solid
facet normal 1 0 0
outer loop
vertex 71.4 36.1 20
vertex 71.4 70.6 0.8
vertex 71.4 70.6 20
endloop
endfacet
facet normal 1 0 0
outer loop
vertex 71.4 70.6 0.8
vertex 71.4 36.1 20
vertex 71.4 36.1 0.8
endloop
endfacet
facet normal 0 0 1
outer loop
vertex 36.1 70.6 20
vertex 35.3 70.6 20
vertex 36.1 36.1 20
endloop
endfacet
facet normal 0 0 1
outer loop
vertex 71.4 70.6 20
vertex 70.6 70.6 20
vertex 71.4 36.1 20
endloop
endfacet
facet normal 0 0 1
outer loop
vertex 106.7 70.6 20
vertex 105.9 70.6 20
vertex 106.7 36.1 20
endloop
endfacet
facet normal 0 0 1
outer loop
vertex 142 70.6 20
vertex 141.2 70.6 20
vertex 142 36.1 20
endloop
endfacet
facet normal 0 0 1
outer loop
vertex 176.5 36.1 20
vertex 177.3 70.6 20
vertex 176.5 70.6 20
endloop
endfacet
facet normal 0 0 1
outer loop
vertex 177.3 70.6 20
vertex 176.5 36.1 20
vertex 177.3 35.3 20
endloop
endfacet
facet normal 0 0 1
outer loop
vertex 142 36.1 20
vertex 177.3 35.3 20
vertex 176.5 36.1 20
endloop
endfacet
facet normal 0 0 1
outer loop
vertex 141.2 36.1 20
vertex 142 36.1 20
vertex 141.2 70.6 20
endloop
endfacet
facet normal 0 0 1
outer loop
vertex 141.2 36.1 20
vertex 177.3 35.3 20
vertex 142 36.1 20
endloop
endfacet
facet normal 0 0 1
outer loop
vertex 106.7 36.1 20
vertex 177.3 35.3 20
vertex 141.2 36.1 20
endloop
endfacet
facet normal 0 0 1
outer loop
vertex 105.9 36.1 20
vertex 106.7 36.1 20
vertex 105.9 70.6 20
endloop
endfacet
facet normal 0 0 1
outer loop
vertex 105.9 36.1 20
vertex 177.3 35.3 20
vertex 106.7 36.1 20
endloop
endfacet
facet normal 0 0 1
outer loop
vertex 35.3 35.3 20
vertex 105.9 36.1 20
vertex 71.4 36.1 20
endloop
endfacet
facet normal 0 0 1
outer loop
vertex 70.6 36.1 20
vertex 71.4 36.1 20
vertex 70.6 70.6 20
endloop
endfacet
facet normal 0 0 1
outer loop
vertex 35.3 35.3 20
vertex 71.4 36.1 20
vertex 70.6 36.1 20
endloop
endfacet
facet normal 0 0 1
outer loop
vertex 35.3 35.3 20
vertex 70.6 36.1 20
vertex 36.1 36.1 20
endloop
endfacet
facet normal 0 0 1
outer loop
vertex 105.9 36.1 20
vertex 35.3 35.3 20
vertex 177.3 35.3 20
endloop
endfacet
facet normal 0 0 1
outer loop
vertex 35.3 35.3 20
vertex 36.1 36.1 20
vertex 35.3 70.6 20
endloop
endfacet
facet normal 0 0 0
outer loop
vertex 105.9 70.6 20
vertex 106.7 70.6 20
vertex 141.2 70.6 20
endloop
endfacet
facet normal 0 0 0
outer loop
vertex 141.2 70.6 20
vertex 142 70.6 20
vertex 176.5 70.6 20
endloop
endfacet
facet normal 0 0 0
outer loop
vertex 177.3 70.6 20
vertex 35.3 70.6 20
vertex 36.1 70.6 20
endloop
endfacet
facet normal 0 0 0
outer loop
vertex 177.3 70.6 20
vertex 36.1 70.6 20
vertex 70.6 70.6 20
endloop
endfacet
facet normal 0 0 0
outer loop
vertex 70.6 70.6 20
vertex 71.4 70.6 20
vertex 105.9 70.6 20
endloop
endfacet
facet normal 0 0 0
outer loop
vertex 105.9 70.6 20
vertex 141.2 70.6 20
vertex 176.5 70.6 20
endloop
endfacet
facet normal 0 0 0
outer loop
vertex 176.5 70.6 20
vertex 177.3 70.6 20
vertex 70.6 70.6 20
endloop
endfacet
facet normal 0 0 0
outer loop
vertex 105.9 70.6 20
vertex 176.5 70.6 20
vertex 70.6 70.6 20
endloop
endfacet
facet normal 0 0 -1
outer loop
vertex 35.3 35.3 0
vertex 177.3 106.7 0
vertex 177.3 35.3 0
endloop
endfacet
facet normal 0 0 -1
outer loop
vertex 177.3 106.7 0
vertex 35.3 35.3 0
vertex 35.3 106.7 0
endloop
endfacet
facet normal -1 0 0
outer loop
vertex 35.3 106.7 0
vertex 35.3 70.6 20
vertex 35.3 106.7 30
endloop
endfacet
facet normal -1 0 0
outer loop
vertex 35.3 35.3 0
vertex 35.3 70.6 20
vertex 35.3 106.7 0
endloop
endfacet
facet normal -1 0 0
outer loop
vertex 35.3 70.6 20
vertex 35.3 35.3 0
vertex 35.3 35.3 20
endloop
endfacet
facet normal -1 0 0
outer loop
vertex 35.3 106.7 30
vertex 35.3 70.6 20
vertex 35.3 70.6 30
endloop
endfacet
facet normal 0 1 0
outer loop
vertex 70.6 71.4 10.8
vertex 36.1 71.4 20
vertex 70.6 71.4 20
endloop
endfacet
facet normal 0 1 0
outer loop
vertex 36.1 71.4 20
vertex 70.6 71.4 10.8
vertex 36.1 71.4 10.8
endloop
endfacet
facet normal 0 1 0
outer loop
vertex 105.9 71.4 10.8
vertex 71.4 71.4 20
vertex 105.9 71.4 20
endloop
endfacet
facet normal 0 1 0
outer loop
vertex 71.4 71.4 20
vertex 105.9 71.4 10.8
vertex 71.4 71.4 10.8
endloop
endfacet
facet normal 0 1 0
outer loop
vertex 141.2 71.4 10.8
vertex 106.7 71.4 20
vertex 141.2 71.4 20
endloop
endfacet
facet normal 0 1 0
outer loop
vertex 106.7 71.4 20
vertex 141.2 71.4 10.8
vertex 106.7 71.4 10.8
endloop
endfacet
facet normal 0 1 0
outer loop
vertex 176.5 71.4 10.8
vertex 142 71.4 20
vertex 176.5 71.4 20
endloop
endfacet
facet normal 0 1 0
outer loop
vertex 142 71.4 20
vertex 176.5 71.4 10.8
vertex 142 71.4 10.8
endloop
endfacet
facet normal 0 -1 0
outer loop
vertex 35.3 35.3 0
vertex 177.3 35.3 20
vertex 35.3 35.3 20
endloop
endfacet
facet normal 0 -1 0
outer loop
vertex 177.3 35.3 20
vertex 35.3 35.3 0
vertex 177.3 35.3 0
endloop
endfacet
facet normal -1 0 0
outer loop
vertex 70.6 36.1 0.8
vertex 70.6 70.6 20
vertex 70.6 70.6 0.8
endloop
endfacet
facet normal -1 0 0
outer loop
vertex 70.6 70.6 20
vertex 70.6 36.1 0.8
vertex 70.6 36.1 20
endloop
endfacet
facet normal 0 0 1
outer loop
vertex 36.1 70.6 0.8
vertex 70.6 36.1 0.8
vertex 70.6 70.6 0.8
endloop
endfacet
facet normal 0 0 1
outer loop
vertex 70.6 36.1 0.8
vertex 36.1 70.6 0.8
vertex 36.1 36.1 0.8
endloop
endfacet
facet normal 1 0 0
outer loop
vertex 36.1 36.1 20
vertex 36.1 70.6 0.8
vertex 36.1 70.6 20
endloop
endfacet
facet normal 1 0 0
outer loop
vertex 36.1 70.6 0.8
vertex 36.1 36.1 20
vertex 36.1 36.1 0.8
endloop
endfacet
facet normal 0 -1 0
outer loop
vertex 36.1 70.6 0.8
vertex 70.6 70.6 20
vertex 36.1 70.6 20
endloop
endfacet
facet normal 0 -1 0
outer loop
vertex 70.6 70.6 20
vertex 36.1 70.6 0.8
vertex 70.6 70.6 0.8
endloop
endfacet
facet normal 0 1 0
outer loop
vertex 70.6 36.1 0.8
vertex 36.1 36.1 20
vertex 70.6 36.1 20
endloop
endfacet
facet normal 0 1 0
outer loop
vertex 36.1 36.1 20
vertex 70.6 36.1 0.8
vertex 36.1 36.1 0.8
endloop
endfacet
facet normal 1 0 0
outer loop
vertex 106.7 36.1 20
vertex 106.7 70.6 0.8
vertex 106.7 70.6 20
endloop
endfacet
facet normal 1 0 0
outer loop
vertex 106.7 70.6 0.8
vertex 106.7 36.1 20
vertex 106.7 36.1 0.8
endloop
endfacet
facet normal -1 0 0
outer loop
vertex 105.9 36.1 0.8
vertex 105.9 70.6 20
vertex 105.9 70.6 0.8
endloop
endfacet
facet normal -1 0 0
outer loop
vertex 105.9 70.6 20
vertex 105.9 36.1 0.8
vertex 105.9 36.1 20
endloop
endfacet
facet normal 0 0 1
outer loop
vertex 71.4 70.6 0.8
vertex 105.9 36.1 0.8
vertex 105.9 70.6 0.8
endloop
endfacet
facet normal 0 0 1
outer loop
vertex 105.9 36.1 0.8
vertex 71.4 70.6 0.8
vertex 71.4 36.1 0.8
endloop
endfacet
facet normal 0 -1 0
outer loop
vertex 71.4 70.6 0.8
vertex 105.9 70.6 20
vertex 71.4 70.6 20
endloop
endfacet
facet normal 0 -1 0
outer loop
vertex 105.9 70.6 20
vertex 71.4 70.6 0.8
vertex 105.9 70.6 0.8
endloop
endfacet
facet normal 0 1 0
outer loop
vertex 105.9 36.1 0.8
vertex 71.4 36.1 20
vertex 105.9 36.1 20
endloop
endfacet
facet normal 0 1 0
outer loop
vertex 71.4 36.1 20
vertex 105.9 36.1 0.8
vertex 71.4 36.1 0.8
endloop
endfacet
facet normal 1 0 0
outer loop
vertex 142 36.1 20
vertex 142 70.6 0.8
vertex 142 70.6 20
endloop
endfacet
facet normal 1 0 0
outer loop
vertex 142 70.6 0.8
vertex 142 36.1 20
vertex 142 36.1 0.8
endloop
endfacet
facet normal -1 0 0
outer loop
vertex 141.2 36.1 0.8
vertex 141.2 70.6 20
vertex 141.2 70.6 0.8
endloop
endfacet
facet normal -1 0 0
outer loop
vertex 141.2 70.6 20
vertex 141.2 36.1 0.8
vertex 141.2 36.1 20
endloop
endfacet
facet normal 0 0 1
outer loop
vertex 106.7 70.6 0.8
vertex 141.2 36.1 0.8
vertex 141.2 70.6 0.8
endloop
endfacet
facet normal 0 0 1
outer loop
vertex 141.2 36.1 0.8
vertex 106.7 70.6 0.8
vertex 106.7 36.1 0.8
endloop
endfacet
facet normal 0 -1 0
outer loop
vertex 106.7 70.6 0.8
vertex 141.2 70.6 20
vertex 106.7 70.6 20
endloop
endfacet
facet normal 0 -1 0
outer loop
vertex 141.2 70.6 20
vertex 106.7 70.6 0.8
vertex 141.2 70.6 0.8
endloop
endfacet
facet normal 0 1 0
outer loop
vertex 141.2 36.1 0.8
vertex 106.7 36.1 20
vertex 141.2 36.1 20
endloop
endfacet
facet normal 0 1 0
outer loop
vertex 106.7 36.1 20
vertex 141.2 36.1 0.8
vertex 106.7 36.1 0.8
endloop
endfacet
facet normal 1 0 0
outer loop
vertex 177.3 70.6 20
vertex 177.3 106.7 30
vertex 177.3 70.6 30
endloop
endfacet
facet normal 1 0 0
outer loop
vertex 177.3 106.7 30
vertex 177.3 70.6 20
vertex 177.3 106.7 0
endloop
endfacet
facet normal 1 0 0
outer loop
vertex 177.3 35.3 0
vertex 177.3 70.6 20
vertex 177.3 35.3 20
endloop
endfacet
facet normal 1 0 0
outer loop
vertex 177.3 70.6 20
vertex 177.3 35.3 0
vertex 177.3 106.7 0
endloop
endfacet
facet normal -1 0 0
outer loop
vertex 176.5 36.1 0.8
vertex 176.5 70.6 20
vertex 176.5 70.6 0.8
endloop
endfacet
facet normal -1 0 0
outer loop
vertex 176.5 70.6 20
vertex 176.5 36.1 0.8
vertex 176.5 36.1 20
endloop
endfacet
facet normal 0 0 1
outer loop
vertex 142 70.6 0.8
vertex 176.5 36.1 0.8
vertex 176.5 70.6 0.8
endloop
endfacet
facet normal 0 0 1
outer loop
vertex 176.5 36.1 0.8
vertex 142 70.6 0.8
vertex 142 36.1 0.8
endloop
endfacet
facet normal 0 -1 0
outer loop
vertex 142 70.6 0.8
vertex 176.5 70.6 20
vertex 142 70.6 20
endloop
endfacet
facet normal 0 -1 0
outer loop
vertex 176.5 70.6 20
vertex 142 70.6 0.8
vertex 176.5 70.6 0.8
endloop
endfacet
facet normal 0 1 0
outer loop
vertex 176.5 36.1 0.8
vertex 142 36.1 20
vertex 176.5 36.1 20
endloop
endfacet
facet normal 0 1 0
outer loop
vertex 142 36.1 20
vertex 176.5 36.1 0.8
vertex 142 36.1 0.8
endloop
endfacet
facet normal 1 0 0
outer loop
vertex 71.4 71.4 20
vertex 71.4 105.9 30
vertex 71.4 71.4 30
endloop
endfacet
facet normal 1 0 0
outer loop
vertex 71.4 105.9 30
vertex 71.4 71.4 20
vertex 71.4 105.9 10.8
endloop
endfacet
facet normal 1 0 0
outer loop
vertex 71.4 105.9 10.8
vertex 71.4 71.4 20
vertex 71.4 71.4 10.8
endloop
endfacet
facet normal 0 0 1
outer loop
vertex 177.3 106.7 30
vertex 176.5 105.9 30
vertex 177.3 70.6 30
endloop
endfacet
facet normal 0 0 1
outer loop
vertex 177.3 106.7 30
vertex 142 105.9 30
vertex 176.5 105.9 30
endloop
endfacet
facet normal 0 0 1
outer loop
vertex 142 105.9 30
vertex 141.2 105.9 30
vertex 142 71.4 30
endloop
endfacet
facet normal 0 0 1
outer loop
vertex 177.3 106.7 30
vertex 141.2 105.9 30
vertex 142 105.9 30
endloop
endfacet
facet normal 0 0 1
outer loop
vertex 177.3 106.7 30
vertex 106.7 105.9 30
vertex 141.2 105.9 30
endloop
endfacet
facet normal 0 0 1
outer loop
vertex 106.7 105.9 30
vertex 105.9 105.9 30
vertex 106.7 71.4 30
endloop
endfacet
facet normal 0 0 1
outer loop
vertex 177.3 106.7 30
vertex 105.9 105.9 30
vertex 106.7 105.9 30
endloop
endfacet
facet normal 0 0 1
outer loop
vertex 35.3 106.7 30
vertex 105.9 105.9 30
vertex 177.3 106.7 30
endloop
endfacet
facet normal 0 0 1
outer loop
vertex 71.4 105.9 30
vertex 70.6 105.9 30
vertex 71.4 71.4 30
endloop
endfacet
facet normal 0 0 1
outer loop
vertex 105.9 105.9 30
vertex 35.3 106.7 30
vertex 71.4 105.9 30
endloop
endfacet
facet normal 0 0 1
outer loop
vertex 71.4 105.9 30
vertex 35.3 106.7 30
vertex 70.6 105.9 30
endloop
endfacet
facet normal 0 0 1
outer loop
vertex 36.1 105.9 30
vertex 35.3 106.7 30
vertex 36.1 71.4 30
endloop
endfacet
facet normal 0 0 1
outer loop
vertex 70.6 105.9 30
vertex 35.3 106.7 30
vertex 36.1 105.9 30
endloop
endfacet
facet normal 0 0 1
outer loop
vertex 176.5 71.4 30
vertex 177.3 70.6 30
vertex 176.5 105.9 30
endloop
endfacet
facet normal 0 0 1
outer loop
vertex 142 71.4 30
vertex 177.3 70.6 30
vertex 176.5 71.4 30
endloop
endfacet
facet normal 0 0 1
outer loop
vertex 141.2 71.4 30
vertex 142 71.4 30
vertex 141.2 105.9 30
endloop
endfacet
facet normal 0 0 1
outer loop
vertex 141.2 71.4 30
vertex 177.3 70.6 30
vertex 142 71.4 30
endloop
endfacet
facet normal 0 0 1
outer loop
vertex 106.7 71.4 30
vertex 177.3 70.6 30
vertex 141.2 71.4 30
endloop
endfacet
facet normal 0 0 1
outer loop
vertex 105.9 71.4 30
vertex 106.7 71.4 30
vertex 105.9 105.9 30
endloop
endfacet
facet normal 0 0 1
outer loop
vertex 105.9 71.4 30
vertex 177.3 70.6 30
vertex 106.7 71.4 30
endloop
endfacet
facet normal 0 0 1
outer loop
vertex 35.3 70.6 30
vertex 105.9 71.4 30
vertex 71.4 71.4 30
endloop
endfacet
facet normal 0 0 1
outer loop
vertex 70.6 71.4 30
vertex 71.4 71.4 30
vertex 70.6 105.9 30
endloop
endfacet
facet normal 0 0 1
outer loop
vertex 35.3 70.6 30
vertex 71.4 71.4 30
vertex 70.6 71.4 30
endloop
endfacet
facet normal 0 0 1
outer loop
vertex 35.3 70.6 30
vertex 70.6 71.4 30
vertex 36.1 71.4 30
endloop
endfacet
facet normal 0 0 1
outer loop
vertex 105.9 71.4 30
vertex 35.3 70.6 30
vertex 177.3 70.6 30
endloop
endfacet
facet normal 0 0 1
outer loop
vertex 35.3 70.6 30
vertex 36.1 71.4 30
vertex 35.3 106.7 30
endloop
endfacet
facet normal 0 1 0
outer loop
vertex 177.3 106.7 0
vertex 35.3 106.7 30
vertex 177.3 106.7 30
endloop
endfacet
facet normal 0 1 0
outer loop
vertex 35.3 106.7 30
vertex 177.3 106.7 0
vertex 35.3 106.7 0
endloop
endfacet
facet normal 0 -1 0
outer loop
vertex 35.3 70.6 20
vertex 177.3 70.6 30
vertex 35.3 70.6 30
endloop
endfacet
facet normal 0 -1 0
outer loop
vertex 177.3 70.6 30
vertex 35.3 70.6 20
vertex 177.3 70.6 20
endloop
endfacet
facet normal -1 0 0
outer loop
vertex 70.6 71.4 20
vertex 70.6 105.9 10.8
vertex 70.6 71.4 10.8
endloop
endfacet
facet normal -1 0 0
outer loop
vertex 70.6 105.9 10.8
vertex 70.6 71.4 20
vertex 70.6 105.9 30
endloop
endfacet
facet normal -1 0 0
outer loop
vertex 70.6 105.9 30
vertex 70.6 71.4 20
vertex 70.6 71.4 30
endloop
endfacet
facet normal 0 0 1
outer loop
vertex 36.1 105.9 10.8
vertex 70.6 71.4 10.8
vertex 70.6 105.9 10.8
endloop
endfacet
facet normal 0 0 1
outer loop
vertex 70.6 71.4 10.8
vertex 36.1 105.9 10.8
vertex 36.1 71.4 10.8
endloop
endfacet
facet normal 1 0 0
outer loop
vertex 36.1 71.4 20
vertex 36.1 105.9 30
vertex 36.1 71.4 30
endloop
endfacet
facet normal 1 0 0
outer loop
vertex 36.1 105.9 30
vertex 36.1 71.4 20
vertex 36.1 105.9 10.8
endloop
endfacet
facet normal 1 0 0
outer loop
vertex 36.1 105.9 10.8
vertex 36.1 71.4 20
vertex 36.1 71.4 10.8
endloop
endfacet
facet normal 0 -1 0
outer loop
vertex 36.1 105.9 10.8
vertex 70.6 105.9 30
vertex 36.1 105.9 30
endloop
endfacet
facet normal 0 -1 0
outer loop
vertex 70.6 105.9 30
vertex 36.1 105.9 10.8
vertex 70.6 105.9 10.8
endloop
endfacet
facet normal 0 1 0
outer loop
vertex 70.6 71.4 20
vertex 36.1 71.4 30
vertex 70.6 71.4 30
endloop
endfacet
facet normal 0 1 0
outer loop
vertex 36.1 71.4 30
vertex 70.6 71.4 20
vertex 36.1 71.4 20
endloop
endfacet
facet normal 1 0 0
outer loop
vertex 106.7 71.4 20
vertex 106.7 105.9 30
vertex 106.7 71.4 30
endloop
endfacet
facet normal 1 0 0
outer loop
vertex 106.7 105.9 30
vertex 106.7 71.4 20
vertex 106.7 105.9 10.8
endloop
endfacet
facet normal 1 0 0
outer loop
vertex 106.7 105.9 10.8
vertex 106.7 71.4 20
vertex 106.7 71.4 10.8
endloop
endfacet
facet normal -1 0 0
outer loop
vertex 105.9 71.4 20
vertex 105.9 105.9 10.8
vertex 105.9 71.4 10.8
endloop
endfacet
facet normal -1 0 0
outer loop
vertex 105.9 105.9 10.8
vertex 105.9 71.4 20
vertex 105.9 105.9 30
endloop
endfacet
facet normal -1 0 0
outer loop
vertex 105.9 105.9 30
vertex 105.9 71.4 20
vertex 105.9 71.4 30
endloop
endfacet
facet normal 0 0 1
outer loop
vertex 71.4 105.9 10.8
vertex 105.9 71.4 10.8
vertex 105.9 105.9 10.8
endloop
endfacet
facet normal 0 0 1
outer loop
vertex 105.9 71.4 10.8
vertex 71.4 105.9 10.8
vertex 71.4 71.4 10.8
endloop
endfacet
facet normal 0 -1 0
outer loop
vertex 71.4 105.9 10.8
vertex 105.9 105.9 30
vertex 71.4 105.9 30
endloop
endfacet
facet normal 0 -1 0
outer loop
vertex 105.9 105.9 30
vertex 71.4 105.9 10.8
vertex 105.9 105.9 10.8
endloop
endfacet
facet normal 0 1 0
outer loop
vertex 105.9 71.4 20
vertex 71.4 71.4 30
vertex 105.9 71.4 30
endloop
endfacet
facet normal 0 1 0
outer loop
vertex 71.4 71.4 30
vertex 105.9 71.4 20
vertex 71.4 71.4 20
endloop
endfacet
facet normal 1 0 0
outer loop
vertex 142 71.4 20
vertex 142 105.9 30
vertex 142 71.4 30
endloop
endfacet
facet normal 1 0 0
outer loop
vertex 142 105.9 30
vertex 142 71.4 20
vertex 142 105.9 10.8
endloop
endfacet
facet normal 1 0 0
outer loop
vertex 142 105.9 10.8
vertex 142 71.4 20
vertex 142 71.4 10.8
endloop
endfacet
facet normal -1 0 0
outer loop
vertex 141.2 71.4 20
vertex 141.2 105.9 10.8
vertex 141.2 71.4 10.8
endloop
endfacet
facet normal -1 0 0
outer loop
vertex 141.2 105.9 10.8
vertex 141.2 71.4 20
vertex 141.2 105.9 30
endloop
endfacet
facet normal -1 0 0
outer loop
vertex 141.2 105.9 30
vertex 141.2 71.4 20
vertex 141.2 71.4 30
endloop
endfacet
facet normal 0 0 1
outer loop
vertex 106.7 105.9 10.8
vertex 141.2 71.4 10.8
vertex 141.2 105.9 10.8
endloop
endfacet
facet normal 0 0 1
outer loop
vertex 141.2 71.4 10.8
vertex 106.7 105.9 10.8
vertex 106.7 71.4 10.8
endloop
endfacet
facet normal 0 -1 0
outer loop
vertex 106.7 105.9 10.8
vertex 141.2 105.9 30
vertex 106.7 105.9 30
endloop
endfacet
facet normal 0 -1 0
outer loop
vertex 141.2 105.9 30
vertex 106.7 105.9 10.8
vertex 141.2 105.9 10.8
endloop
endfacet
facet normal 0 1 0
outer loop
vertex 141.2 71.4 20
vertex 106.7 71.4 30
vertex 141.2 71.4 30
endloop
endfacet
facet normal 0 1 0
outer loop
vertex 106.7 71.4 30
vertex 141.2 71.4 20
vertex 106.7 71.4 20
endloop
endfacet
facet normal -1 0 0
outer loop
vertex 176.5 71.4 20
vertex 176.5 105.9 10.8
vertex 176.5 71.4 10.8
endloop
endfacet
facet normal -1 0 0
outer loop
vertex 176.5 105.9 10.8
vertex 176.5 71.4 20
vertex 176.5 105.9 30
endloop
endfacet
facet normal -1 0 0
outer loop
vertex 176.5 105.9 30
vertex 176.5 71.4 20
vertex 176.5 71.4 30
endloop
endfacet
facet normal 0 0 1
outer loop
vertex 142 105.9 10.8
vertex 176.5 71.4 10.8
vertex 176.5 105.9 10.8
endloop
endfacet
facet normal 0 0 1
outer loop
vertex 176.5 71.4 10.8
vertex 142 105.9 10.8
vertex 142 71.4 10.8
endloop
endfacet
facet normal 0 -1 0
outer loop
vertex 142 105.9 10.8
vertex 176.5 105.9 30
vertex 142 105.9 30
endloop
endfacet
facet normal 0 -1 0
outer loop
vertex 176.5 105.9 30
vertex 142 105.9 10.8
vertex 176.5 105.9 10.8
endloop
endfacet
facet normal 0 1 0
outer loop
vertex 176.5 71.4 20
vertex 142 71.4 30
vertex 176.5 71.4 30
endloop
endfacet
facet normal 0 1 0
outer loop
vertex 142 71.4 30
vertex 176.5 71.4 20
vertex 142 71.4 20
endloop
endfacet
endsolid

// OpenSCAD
cols=4; // number of columns
rows=2; // number of rows
diam=34.5; // bottle diameter (Revell Aqua 34.5)
t=0.8; // wall thickness
step=10; // step height

for (i=[1:rows]) {
    for (j=[1:cols]) {
        translate([j*(diam+t),i*(diam+t),0]) 
        difference() {
              cube([diam+2*t,diam+2*t,i*step+(20-step)]);
              translate([t,t,(i-1)*step+t]) cube([diam,diam,20]);
          }
    }
}
